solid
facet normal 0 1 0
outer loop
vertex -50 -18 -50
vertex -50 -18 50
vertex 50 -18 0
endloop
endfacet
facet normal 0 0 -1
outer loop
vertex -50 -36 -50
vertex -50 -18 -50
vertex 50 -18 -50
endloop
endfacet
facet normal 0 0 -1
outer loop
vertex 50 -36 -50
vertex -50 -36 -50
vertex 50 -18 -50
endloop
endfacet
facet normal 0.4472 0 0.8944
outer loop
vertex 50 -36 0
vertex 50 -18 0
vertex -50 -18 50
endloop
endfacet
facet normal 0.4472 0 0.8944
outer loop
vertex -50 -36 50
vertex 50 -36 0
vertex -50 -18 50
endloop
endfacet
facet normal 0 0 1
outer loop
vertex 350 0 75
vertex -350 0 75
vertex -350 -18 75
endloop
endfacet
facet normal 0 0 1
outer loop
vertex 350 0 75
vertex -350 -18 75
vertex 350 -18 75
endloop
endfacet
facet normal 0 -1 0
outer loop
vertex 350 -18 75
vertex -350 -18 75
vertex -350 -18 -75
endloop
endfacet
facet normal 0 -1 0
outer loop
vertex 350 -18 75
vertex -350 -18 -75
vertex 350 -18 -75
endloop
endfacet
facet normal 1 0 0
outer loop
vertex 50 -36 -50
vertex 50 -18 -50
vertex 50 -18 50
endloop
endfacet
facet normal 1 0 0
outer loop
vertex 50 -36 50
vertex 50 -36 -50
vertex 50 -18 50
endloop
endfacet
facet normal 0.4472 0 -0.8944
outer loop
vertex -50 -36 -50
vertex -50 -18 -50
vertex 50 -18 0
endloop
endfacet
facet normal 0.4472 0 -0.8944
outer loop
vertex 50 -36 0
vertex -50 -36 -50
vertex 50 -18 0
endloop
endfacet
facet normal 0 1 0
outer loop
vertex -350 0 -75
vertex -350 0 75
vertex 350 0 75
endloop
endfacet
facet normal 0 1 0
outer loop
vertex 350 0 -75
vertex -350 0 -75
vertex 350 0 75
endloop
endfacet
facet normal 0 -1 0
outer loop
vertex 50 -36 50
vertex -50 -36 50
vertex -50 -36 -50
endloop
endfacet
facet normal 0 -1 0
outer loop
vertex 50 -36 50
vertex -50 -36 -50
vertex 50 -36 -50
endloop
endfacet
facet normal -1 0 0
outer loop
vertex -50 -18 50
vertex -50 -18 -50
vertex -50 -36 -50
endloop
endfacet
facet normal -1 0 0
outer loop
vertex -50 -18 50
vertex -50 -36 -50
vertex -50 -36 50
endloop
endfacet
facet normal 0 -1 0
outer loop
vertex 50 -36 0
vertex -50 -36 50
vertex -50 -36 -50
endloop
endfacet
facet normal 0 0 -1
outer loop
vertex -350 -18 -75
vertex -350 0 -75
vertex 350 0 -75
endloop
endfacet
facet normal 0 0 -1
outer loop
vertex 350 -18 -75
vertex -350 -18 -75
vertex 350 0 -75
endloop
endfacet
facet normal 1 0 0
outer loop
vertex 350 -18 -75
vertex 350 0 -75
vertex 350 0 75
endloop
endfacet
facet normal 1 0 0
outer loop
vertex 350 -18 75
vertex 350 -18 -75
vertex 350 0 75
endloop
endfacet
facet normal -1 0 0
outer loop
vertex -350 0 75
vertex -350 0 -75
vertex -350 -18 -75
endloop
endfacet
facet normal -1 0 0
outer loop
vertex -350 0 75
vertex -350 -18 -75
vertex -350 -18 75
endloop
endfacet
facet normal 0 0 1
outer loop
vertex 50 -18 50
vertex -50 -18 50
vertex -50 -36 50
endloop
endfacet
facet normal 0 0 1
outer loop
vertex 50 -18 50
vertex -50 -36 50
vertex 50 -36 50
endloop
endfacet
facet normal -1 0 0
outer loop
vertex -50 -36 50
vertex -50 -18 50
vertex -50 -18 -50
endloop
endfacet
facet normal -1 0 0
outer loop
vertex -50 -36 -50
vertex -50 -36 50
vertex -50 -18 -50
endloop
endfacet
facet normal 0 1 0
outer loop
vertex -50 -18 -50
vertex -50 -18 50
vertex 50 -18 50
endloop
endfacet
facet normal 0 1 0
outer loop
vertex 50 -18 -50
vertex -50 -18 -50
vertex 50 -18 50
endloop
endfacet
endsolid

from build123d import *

# Parameters (mm, degrees)
F0_W     = 700
F0_H     = 150
F1_DEPTH = 18
F2_W     = 100
F2_H     = 100
F3_DEPTH = 18
F5_DEPTH = 18


with BuildPart() as f1:
    # F0 (on Front) → F1 (new body)
    with BuildSketch(Plane.XZ):
        Rectangle(F0_W, F0_H)
    extrude(amount=F1_DEPTH)


with BuildPart() as f3:
    # F2 (on face) → F3 (new body)
    with BuildSketch(Plane.XZ.offset(18)):
        Rectangle(F2_W, F2_H)
    extrude(amount=F3_DEPTH)


with BuildPart() as f5:
    # F4 (on face) → F5 (new body)
    with BuildSketch(Plane.XZ.offset(18)):
        Polygon((50, 0), (-50, 50), (-50, -50), align=None)
    extrude(amount=F5_DEPTH)


solid = Compound([f1.part, f3.part, f5.part])
